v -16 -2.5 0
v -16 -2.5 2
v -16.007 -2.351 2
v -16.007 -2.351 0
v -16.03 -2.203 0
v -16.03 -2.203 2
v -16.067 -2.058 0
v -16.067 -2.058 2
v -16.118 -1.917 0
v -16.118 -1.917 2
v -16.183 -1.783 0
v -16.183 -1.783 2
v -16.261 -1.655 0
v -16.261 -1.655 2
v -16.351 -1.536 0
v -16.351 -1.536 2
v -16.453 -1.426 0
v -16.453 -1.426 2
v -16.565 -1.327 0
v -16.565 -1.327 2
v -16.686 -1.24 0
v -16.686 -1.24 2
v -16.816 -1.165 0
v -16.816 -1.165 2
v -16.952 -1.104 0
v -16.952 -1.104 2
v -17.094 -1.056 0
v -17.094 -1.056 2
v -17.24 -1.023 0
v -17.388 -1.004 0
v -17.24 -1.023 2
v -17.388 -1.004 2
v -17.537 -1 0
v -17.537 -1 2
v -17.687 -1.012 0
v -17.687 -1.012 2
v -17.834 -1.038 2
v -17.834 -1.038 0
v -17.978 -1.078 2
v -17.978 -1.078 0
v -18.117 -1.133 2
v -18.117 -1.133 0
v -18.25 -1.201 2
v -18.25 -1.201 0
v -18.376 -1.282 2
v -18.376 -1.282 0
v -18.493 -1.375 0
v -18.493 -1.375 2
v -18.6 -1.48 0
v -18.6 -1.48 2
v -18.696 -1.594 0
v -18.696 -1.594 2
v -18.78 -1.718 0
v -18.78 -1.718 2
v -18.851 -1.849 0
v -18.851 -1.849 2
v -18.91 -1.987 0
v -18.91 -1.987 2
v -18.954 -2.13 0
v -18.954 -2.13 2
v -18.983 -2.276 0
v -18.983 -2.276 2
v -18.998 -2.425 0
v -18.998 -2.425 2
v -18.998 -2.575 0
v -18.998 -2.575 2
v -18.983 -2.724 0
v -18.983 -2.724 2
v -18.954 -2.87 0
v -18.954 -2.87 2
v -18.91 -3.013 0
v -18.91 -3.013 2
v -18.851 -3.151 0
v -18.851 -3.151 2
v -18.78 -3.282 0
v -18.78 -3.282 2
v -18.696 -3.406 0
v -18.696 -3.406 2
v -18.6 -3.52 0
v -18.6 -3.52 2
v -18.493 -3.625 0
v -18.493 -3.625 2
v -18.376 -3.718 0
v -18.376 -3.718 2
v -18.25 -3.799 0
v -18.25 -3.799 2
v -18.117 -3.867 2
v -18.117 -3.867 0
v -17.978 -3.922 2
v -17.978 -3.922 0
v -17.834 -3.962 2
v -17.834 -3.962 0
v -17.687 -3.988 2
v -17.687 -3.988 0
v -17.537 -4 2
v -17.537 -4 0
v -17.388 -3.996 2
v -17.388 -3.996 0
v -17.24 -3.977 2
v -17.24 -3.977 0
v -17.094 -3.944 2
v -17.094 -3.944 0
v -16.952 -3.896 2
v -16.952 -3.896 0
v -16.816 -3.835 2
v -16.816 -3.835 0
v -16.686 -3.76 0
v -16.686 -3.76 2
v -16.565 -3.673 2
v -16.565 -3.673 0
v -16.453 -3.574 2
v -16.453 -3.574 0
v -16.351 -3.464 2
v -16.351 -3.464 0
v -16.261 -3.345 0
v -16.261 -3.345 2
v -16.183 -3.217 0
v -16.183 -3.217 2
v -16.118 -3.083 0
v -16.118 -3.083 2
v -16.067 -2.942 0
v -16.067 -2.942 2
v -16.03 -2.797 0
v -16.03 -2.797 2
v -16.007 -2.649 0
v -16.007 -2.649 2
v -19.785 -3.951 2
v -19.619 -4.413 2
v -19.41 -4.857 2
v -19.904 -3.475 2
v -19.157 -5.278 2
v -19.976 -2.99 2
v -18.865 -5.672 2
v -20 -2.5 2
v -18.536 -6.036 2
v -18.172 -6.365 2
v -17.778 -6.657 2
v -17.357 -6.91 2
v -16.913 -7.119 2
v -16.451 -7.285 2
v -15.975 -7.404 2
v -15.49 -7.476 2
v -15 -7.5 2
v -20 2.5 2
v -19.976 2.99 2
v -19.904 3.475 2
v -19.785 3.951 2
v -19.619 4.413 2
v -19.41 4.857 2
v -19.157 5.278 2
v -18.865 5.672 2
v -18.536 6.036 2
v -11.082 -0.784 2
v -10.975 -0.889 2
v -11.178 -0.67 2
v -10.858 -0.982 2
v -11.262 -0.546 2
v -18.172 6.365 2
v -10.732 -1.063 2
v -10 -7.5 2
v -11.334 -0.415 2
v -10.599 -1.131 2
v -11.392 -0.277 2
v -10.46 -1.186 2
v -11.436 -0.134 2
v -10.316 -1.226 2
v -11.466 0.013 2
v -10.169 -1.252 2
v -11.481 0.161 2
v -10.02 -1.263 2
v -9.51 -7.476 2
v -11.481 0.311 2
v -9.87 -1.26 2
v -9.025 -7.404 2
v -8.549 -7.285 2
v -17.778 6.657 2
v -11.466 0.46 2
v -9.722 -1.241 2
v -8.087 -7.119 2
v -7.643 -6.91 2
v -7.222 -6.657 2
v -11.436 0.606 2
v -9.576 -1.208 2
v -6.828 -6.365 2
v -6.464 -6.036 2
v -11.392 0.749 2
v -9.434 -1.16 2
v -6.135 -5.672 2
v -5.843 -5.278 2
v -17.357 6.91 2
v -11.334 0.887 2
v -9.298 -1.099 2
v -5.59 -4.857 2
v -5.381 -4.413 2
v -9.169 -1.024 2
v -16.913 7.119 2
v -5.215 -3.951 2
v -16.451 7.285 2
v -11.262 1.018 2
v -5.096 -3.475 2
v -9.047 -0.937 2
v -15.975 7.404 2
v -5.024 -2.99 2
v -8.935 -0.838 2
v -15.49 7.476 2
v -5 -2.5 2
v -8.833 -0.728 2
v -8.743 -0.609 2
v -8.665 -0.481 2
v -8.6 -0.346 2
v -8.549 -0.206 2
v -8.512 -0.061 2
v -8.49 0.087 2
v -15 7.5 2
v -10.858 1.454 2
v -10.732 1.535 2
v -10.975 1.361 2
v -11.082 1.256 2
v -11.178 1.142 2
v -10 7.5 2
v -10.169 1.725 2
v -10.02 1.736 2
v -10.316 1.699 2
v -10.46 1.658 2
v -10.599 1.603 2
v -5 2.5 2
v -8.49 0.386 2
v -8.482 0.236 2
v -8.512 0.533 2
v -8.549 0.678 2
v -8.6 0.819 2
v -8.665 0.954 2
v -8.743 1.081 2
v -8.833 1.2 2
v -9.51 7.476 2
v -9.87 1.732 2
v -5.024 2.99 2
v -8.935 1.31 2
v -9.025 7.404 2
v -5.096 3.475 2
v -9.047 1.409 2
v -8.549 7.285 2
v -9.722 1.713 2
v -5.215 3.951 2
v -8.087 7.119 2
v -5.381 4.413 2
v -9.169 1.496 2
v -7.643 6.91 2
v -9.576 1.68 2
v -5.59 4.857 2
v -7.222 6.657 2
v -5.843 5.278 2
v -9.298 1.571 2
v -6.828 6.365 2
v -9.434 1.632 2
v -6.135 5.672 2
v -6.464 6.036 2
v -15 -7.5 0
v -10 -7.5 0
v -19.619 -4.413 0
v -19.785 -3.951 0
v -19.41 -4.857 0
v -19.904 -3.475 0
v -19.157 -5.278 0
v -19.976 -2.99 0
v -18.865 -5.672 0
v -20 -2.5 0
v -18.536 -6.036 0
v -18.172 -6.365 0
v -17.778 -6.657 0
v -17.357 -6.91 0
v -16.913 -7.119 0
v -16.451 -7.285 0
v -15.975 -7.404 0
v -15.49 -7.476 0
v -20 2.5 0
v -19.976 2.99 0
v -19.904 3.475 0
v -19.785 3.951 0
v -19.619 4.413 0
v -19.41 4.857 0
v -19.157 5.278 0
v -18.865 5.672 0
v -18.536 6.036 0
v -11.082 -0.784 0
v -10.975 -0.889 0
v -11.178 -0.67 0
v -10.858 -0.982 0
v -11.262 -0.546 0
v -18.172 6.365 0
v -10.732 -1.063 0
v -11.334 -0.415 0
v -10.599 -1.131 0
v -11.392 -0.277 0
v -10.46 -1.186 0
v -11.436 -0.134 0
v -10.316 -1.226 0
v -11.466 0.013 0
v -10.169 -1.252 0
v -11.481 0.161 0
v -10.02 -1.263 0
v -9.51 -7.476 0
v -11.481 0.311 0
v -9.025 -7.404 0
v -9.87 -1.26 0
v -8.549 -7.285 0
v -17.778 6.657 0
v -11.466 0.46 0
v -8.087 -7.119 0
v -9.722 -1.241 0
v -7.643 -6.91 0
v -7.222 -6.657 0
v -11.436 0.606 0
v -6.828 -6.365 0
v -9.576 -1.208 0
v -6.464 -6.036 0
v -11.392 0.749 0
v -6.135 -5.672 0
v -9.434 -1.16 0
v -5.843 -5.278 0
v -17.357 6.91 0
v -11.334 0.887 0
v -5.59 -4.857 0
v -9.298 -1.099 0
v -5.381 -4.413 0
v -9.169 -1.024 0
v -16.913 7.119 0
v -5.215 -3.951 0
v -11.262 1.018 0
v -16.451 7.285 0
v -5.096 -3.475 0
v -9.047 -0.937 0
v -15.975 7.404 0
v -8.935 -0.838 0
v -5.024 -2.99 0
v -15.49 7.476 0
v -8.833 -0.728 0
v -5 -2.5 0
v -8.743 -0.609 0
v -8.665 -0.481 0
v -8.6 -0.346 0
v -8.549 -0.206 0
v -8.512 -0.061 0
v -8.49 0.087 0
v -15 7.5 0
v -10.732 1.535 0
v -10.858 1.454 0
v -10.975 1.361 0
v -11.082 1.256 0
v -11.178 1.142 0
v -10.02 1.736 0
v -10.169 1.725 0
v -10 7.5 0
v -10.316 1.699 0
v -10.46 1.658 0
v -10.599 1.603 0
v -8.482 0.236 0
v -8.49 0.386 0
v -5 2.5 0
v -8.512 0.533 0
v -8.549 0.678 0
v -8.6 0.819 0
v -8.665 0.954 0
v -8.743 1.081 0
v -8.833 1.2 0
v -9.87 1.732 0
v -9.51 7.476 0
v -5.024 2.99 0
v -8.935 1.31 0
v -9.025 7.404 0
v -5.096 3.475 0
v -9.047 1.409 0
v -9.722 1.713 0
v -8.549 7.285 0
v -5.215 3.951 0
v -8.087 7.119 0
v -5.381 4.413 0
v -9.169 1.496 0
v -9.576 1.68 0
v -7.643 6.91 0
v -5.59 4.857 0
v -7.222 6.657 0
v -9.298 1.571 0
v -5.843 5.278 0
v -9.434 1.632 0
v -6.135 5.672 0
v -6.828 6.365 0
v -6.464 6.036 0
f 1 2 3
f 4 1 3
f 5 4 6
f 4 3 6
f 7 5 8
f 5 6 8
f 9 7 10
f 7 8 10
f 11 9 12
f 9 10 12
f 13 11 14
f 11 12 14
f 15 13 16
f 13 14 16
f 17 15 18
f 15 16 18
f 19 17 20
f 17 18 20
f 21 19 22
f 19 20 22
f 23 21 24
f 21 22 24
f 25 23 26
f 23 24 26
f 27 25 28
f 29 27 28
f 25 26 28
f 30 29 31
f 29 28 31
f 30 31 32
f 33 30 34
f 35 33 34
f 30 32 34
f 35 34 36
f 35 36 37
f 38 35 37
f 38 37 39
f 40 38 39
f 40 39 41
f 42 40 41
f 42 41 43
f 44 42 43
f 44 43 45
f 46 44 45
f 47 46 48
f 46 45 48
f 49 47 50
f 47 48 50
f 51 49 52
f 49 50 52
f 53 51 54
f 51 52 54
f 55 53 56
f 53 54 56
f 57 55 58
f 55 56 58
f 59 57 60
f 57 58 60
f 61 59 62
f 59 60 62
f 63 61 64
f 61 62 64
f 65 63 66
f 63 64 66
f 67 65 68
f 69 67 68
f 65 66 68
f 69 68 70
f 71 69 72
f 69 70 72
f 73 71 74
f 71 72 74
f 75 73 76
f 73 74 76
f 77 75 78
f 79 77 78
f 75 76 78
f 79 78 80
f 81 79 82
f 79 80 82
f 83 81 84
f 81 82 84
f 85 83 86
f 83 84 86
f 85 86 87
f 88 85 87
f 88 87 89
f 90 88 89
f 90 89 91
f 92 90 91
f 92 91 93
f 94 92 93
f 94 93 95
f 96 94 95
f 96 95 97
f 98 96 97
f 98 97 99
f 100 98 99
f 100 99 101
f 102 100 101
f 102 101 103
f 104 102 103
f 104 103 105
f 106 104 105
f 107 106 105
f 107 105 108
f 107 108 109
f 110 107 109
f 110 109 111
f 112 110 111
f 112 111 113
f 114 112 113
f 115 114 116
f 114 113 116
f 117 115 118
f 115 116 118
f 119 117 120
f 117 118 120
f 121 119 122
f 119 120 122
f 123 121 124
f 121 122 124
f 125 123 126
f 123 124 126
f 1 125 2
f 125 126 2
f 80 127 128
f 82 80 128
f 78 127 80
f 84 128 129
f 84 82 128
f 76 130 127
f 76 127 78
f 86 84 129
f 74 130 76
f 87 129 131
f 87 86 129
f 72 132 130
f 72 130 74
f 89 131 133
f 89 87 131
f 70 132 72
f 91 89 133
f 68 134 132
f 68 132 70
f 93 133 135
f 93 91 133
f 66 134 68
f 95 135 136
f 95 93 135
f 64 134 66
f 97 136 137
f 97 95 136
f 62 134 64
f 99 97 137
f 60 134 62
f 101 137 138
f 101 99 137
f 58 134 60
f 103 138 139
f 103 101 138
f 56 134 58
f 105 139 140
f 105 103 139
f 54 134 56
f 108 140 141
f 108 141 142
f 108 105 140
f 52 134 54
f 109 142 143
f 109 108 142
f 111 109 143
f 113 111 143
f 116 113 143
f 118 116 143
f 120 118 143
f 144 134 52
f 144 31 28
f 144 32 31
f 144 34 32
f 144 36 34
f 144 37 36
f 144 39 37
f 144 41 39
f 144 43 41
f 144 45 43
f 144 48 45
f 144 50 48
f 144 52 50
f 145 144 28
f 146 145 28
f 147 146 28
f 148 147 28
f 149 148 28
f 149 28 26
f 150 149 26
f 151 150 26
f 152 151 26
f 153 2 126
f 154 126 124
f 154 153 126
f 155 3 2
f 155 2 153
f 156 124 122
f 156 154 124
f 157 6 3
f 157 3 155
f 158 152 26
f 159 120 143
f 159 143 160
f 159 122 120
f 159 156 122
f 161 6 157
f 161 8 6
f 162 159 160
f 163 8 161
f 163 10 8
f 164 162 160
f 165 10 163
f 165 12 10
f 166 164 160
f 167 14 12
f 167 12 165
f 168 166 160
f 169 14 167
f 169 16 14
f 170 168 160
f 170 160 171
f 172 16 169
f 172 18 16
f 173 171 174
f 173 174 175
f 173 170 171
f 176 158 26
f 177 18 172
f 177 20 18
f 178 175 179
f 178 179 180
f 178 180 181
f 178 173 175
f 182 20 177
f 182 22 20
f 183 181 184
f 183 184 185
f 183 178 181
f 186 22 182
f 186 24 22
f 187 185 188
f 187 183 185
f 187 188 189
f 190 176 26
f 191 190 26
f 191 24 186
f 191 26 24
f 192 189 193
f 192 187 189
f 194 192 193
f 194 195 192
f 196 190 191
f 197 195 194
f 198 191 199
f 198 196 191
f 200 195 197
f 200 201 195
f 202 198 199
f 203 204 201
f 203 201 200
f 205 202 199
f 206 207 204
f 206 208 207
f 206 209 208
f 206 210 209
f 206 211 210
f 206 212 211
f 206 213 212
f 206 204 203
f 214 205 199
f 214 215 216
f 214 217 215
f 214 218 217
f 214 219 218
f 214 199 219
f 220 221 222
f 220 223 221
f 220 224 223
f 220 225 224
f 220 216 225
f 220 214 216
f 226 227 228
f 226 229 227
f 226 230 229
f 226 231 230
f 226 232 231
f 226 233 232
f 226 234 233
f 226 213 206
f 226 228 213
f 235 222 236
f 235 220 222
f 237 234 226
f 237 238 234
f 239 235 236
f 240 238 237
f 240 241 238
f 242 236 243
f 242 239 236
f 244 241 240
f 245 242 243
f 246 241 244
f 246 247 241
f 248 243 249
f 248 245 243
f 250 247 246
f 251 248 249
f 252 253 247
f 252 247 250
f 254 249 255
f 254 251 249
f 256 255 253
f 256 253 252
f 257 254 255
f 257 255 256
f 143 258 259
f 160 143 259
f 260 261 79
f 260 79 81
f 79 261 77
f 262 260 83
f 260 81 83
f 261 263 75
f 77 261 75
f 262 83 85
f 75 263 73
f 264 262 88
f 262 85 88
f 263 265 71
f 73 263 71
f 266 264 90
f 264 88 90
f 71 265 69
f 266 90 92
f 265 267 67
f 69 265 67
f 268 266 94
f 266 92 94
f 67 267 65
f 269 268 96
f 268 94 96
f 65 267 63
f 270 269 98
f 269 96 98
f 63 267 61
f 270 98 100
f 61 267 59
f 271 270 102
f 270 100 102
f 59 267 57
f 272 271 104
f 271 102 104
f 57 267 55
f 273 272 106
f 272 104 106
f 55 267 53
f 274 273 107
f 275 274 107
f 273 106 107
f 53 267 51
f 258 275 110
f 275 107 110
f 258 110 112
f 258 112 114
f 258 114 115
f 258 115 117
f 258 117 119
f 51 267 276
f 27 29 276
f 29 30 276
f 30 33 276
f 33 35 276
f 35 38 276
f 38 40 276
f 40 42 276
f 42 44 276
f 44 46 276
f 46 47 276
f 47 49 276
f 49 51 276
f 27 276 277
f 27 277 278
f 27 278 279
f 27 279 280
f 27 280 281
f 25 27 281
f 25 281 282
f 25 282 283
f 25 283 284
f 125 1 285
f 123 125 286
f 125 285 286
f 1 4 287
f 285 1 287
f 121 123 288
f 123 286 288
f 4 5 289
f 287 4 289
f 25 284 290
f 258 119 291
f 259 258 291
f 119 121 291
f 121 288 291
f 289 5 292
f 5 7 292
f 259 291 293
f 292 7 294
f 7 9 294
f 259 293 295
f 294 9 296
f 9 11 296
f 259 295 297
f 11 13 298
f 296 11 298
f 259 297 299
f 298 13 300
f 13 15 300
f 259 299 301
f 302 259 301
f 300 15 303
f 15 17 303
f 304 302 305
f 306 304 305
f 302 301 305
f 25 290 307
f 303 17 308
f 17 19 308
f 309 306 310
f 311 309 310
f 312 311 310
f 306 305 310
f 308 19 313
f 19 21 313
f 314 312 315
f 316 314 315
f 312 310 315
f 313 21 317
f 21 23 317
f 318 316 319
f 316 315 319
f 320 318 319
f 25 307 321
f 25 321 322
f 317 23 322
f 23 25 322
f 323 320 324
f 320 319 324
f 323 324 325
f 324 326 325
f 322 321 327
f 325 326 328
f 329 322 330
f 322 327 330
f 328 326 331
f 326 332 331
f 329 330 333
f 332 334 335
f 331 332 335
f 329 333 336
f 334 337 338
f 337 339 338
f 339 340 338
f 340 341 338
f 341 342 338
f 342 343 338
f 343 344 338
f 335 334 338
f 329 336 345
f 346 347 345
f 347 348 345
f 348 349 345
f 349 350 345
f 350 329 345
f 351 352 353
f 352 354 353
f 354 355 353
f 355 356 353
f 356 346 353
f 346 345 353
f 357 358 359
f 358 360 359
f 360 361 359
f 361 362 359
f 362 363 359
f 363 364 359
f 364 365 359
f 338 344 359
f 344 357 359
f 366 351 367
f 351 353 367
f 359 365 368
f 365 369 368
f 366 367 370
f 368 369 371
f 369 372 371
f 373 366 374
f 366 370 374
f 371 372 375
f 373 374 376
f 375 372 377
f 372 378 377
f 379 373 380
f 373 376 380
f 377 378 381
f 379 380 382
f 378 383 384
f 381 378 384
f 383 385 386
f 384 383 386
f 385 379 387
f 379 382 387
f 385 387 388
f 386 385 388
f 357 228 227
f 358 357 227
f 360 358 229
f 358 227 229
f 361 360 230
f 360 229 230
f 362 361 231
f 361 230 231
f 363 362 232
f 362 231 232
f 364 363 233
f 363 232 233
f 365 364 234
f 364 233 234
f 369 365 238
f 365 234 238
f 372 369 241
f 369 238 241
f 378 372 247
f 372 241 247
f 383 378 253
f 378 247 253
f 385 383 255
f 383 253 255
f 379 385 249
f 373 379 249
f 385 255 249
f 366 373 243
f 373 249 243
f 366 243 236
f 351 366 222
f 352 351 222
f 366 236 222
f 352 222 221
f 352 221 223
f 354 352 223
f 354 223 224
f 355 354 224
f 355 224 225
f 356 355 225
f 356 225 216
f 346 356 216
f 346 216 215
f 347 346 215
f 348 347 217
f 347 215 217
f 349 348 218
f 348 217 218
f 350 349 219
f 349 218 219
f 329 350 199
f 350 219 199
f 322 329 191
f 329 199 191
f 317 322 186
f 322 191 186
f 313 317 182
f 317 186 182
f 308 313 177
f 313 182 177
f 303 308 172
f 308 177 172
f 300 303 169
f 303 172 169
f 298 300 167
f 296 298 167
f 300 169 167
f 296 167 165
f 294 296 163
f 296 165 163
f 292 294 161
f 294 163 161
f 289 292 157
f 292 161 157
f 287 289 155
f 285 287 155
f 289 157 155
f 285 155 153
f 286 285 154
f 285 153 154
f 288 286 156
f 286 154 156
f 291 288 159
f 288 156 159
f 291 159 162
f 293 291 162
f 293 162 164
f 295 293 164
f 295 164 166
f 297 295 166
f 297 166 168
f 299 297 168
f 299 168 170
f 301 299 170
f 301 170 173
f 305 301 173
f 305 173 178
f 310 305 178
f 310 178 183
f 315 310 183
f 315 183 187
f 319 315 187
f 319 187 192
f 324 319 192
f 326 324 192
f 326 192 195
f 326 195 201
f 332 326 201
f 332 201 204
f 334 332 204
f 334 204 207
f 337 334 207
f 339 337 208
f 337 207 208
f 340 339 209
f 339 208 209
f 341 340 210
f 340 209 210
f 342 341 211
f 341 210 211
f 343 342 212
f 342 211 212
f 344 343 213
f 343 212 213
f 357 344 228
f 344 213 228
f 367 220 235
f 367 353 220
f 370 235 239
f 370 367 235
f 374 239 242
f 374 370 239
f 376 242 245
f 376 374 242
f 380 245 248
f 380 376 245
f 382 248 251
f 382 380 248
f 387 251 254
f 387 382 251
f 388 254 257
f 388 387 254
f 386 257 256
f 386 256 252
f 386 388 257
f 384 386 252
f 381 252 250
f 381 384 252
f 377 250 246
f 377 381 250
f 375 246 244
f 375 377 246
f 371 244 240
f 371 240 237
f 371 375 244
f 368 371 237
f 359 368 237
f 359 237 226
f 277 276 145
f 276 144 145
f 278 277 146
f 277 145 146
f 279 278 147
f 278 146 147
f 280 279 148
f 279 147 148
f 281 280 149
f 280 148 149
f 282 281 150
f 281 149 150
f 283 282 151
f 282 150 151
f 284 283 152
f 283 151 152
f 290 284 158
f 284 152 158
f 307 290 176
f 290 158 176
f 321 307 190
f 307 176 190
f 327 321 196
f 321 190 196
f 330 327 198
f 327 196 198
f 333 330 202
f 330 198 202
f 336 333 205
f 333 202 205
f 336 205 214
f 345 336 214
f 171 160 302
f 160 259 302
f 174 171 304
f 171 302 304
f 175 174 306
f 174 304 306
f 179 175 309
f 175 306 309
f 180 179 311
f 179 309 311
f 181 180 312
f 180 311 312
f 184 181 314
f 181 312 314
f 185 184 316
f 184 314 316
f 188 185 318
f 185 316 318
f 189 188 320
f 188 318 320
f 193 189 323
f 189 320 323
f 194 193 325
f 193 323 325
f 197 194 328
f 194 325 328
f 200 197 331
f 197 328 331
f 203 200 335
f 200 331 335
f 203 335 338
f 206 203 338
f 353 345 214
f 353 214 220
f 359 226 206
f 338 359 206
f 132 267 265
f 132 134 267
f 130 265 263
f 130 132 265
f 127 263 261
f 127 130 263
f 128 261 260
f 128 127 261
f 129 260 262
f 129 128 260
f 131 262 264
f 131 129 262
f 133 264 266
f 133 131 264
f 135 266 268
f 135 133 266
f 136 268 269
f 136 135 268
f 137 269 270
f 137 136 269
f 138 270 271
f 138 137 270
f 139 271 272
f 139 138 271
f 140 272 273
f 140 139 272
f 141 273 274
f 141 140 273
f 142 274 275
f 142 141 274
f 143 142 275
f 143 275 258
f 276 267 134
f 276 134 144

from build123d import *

# Parameters (mm, degrees)
SKETCH_1_W          = 40
SKETCH_1_H          = 15
EXTRUDE_1_DEPTH     = 2
SKETCH_3_R          = 1.5
CUT_EXTRUDE_1_DEPTH = 2
CUT_EXTRUDE_2_DEPTH = 10
FILLET_1_R          = 5


with BuildPart() as part:
    # 草图1 → 凸台-拉伸1 (new body)
    with BuildSketch(Plane.XY):
        Rectangle(SKETCH_1_W, SKETCH_1_H)
    extrude(amount=EXTRUDE_1_DEPTH)

    # 草图3 → 切除-拉伸1 (cut)
    with BuildSketch(Plane.XY.offset(2)):
        with Locations((-9.982459034, 0.236161147)):
            Circle(SKETCH_3_R)
        with Locations((-17.5, -2.5)):
            Circle(SKETCH_3_R)
    extrude(amount=-CUT_EXTRUDE_1_DEPTH, mode=Mode.SUBTRACT)

    # 草图6 → 切除-拉伸2 (cut)
    with BuildSketch(Plane.XY.offset(2)):
        Polygon((-5, 7.5), (-5, -7.5), (36.148851336, -18.495224014), (30.781609857, 18.543577541), align=None)
    extrude(amount=-CUT_EXTRUDE_2_DEPTH, mode=Mode.SUBTRACT)

    # 圆角1
    fillet_1_edges = [part.edges().sort_by_distance(p)[0] for p in [
        (-5, 7.5, 1),
        (-5, -7.5, 1),
        (-20, -7.5, 1),
        (-20, 7.5, 1),
    ]]
    fillet(fillet_1_edges, radius=FILLET_1_R)


solid = part.part
